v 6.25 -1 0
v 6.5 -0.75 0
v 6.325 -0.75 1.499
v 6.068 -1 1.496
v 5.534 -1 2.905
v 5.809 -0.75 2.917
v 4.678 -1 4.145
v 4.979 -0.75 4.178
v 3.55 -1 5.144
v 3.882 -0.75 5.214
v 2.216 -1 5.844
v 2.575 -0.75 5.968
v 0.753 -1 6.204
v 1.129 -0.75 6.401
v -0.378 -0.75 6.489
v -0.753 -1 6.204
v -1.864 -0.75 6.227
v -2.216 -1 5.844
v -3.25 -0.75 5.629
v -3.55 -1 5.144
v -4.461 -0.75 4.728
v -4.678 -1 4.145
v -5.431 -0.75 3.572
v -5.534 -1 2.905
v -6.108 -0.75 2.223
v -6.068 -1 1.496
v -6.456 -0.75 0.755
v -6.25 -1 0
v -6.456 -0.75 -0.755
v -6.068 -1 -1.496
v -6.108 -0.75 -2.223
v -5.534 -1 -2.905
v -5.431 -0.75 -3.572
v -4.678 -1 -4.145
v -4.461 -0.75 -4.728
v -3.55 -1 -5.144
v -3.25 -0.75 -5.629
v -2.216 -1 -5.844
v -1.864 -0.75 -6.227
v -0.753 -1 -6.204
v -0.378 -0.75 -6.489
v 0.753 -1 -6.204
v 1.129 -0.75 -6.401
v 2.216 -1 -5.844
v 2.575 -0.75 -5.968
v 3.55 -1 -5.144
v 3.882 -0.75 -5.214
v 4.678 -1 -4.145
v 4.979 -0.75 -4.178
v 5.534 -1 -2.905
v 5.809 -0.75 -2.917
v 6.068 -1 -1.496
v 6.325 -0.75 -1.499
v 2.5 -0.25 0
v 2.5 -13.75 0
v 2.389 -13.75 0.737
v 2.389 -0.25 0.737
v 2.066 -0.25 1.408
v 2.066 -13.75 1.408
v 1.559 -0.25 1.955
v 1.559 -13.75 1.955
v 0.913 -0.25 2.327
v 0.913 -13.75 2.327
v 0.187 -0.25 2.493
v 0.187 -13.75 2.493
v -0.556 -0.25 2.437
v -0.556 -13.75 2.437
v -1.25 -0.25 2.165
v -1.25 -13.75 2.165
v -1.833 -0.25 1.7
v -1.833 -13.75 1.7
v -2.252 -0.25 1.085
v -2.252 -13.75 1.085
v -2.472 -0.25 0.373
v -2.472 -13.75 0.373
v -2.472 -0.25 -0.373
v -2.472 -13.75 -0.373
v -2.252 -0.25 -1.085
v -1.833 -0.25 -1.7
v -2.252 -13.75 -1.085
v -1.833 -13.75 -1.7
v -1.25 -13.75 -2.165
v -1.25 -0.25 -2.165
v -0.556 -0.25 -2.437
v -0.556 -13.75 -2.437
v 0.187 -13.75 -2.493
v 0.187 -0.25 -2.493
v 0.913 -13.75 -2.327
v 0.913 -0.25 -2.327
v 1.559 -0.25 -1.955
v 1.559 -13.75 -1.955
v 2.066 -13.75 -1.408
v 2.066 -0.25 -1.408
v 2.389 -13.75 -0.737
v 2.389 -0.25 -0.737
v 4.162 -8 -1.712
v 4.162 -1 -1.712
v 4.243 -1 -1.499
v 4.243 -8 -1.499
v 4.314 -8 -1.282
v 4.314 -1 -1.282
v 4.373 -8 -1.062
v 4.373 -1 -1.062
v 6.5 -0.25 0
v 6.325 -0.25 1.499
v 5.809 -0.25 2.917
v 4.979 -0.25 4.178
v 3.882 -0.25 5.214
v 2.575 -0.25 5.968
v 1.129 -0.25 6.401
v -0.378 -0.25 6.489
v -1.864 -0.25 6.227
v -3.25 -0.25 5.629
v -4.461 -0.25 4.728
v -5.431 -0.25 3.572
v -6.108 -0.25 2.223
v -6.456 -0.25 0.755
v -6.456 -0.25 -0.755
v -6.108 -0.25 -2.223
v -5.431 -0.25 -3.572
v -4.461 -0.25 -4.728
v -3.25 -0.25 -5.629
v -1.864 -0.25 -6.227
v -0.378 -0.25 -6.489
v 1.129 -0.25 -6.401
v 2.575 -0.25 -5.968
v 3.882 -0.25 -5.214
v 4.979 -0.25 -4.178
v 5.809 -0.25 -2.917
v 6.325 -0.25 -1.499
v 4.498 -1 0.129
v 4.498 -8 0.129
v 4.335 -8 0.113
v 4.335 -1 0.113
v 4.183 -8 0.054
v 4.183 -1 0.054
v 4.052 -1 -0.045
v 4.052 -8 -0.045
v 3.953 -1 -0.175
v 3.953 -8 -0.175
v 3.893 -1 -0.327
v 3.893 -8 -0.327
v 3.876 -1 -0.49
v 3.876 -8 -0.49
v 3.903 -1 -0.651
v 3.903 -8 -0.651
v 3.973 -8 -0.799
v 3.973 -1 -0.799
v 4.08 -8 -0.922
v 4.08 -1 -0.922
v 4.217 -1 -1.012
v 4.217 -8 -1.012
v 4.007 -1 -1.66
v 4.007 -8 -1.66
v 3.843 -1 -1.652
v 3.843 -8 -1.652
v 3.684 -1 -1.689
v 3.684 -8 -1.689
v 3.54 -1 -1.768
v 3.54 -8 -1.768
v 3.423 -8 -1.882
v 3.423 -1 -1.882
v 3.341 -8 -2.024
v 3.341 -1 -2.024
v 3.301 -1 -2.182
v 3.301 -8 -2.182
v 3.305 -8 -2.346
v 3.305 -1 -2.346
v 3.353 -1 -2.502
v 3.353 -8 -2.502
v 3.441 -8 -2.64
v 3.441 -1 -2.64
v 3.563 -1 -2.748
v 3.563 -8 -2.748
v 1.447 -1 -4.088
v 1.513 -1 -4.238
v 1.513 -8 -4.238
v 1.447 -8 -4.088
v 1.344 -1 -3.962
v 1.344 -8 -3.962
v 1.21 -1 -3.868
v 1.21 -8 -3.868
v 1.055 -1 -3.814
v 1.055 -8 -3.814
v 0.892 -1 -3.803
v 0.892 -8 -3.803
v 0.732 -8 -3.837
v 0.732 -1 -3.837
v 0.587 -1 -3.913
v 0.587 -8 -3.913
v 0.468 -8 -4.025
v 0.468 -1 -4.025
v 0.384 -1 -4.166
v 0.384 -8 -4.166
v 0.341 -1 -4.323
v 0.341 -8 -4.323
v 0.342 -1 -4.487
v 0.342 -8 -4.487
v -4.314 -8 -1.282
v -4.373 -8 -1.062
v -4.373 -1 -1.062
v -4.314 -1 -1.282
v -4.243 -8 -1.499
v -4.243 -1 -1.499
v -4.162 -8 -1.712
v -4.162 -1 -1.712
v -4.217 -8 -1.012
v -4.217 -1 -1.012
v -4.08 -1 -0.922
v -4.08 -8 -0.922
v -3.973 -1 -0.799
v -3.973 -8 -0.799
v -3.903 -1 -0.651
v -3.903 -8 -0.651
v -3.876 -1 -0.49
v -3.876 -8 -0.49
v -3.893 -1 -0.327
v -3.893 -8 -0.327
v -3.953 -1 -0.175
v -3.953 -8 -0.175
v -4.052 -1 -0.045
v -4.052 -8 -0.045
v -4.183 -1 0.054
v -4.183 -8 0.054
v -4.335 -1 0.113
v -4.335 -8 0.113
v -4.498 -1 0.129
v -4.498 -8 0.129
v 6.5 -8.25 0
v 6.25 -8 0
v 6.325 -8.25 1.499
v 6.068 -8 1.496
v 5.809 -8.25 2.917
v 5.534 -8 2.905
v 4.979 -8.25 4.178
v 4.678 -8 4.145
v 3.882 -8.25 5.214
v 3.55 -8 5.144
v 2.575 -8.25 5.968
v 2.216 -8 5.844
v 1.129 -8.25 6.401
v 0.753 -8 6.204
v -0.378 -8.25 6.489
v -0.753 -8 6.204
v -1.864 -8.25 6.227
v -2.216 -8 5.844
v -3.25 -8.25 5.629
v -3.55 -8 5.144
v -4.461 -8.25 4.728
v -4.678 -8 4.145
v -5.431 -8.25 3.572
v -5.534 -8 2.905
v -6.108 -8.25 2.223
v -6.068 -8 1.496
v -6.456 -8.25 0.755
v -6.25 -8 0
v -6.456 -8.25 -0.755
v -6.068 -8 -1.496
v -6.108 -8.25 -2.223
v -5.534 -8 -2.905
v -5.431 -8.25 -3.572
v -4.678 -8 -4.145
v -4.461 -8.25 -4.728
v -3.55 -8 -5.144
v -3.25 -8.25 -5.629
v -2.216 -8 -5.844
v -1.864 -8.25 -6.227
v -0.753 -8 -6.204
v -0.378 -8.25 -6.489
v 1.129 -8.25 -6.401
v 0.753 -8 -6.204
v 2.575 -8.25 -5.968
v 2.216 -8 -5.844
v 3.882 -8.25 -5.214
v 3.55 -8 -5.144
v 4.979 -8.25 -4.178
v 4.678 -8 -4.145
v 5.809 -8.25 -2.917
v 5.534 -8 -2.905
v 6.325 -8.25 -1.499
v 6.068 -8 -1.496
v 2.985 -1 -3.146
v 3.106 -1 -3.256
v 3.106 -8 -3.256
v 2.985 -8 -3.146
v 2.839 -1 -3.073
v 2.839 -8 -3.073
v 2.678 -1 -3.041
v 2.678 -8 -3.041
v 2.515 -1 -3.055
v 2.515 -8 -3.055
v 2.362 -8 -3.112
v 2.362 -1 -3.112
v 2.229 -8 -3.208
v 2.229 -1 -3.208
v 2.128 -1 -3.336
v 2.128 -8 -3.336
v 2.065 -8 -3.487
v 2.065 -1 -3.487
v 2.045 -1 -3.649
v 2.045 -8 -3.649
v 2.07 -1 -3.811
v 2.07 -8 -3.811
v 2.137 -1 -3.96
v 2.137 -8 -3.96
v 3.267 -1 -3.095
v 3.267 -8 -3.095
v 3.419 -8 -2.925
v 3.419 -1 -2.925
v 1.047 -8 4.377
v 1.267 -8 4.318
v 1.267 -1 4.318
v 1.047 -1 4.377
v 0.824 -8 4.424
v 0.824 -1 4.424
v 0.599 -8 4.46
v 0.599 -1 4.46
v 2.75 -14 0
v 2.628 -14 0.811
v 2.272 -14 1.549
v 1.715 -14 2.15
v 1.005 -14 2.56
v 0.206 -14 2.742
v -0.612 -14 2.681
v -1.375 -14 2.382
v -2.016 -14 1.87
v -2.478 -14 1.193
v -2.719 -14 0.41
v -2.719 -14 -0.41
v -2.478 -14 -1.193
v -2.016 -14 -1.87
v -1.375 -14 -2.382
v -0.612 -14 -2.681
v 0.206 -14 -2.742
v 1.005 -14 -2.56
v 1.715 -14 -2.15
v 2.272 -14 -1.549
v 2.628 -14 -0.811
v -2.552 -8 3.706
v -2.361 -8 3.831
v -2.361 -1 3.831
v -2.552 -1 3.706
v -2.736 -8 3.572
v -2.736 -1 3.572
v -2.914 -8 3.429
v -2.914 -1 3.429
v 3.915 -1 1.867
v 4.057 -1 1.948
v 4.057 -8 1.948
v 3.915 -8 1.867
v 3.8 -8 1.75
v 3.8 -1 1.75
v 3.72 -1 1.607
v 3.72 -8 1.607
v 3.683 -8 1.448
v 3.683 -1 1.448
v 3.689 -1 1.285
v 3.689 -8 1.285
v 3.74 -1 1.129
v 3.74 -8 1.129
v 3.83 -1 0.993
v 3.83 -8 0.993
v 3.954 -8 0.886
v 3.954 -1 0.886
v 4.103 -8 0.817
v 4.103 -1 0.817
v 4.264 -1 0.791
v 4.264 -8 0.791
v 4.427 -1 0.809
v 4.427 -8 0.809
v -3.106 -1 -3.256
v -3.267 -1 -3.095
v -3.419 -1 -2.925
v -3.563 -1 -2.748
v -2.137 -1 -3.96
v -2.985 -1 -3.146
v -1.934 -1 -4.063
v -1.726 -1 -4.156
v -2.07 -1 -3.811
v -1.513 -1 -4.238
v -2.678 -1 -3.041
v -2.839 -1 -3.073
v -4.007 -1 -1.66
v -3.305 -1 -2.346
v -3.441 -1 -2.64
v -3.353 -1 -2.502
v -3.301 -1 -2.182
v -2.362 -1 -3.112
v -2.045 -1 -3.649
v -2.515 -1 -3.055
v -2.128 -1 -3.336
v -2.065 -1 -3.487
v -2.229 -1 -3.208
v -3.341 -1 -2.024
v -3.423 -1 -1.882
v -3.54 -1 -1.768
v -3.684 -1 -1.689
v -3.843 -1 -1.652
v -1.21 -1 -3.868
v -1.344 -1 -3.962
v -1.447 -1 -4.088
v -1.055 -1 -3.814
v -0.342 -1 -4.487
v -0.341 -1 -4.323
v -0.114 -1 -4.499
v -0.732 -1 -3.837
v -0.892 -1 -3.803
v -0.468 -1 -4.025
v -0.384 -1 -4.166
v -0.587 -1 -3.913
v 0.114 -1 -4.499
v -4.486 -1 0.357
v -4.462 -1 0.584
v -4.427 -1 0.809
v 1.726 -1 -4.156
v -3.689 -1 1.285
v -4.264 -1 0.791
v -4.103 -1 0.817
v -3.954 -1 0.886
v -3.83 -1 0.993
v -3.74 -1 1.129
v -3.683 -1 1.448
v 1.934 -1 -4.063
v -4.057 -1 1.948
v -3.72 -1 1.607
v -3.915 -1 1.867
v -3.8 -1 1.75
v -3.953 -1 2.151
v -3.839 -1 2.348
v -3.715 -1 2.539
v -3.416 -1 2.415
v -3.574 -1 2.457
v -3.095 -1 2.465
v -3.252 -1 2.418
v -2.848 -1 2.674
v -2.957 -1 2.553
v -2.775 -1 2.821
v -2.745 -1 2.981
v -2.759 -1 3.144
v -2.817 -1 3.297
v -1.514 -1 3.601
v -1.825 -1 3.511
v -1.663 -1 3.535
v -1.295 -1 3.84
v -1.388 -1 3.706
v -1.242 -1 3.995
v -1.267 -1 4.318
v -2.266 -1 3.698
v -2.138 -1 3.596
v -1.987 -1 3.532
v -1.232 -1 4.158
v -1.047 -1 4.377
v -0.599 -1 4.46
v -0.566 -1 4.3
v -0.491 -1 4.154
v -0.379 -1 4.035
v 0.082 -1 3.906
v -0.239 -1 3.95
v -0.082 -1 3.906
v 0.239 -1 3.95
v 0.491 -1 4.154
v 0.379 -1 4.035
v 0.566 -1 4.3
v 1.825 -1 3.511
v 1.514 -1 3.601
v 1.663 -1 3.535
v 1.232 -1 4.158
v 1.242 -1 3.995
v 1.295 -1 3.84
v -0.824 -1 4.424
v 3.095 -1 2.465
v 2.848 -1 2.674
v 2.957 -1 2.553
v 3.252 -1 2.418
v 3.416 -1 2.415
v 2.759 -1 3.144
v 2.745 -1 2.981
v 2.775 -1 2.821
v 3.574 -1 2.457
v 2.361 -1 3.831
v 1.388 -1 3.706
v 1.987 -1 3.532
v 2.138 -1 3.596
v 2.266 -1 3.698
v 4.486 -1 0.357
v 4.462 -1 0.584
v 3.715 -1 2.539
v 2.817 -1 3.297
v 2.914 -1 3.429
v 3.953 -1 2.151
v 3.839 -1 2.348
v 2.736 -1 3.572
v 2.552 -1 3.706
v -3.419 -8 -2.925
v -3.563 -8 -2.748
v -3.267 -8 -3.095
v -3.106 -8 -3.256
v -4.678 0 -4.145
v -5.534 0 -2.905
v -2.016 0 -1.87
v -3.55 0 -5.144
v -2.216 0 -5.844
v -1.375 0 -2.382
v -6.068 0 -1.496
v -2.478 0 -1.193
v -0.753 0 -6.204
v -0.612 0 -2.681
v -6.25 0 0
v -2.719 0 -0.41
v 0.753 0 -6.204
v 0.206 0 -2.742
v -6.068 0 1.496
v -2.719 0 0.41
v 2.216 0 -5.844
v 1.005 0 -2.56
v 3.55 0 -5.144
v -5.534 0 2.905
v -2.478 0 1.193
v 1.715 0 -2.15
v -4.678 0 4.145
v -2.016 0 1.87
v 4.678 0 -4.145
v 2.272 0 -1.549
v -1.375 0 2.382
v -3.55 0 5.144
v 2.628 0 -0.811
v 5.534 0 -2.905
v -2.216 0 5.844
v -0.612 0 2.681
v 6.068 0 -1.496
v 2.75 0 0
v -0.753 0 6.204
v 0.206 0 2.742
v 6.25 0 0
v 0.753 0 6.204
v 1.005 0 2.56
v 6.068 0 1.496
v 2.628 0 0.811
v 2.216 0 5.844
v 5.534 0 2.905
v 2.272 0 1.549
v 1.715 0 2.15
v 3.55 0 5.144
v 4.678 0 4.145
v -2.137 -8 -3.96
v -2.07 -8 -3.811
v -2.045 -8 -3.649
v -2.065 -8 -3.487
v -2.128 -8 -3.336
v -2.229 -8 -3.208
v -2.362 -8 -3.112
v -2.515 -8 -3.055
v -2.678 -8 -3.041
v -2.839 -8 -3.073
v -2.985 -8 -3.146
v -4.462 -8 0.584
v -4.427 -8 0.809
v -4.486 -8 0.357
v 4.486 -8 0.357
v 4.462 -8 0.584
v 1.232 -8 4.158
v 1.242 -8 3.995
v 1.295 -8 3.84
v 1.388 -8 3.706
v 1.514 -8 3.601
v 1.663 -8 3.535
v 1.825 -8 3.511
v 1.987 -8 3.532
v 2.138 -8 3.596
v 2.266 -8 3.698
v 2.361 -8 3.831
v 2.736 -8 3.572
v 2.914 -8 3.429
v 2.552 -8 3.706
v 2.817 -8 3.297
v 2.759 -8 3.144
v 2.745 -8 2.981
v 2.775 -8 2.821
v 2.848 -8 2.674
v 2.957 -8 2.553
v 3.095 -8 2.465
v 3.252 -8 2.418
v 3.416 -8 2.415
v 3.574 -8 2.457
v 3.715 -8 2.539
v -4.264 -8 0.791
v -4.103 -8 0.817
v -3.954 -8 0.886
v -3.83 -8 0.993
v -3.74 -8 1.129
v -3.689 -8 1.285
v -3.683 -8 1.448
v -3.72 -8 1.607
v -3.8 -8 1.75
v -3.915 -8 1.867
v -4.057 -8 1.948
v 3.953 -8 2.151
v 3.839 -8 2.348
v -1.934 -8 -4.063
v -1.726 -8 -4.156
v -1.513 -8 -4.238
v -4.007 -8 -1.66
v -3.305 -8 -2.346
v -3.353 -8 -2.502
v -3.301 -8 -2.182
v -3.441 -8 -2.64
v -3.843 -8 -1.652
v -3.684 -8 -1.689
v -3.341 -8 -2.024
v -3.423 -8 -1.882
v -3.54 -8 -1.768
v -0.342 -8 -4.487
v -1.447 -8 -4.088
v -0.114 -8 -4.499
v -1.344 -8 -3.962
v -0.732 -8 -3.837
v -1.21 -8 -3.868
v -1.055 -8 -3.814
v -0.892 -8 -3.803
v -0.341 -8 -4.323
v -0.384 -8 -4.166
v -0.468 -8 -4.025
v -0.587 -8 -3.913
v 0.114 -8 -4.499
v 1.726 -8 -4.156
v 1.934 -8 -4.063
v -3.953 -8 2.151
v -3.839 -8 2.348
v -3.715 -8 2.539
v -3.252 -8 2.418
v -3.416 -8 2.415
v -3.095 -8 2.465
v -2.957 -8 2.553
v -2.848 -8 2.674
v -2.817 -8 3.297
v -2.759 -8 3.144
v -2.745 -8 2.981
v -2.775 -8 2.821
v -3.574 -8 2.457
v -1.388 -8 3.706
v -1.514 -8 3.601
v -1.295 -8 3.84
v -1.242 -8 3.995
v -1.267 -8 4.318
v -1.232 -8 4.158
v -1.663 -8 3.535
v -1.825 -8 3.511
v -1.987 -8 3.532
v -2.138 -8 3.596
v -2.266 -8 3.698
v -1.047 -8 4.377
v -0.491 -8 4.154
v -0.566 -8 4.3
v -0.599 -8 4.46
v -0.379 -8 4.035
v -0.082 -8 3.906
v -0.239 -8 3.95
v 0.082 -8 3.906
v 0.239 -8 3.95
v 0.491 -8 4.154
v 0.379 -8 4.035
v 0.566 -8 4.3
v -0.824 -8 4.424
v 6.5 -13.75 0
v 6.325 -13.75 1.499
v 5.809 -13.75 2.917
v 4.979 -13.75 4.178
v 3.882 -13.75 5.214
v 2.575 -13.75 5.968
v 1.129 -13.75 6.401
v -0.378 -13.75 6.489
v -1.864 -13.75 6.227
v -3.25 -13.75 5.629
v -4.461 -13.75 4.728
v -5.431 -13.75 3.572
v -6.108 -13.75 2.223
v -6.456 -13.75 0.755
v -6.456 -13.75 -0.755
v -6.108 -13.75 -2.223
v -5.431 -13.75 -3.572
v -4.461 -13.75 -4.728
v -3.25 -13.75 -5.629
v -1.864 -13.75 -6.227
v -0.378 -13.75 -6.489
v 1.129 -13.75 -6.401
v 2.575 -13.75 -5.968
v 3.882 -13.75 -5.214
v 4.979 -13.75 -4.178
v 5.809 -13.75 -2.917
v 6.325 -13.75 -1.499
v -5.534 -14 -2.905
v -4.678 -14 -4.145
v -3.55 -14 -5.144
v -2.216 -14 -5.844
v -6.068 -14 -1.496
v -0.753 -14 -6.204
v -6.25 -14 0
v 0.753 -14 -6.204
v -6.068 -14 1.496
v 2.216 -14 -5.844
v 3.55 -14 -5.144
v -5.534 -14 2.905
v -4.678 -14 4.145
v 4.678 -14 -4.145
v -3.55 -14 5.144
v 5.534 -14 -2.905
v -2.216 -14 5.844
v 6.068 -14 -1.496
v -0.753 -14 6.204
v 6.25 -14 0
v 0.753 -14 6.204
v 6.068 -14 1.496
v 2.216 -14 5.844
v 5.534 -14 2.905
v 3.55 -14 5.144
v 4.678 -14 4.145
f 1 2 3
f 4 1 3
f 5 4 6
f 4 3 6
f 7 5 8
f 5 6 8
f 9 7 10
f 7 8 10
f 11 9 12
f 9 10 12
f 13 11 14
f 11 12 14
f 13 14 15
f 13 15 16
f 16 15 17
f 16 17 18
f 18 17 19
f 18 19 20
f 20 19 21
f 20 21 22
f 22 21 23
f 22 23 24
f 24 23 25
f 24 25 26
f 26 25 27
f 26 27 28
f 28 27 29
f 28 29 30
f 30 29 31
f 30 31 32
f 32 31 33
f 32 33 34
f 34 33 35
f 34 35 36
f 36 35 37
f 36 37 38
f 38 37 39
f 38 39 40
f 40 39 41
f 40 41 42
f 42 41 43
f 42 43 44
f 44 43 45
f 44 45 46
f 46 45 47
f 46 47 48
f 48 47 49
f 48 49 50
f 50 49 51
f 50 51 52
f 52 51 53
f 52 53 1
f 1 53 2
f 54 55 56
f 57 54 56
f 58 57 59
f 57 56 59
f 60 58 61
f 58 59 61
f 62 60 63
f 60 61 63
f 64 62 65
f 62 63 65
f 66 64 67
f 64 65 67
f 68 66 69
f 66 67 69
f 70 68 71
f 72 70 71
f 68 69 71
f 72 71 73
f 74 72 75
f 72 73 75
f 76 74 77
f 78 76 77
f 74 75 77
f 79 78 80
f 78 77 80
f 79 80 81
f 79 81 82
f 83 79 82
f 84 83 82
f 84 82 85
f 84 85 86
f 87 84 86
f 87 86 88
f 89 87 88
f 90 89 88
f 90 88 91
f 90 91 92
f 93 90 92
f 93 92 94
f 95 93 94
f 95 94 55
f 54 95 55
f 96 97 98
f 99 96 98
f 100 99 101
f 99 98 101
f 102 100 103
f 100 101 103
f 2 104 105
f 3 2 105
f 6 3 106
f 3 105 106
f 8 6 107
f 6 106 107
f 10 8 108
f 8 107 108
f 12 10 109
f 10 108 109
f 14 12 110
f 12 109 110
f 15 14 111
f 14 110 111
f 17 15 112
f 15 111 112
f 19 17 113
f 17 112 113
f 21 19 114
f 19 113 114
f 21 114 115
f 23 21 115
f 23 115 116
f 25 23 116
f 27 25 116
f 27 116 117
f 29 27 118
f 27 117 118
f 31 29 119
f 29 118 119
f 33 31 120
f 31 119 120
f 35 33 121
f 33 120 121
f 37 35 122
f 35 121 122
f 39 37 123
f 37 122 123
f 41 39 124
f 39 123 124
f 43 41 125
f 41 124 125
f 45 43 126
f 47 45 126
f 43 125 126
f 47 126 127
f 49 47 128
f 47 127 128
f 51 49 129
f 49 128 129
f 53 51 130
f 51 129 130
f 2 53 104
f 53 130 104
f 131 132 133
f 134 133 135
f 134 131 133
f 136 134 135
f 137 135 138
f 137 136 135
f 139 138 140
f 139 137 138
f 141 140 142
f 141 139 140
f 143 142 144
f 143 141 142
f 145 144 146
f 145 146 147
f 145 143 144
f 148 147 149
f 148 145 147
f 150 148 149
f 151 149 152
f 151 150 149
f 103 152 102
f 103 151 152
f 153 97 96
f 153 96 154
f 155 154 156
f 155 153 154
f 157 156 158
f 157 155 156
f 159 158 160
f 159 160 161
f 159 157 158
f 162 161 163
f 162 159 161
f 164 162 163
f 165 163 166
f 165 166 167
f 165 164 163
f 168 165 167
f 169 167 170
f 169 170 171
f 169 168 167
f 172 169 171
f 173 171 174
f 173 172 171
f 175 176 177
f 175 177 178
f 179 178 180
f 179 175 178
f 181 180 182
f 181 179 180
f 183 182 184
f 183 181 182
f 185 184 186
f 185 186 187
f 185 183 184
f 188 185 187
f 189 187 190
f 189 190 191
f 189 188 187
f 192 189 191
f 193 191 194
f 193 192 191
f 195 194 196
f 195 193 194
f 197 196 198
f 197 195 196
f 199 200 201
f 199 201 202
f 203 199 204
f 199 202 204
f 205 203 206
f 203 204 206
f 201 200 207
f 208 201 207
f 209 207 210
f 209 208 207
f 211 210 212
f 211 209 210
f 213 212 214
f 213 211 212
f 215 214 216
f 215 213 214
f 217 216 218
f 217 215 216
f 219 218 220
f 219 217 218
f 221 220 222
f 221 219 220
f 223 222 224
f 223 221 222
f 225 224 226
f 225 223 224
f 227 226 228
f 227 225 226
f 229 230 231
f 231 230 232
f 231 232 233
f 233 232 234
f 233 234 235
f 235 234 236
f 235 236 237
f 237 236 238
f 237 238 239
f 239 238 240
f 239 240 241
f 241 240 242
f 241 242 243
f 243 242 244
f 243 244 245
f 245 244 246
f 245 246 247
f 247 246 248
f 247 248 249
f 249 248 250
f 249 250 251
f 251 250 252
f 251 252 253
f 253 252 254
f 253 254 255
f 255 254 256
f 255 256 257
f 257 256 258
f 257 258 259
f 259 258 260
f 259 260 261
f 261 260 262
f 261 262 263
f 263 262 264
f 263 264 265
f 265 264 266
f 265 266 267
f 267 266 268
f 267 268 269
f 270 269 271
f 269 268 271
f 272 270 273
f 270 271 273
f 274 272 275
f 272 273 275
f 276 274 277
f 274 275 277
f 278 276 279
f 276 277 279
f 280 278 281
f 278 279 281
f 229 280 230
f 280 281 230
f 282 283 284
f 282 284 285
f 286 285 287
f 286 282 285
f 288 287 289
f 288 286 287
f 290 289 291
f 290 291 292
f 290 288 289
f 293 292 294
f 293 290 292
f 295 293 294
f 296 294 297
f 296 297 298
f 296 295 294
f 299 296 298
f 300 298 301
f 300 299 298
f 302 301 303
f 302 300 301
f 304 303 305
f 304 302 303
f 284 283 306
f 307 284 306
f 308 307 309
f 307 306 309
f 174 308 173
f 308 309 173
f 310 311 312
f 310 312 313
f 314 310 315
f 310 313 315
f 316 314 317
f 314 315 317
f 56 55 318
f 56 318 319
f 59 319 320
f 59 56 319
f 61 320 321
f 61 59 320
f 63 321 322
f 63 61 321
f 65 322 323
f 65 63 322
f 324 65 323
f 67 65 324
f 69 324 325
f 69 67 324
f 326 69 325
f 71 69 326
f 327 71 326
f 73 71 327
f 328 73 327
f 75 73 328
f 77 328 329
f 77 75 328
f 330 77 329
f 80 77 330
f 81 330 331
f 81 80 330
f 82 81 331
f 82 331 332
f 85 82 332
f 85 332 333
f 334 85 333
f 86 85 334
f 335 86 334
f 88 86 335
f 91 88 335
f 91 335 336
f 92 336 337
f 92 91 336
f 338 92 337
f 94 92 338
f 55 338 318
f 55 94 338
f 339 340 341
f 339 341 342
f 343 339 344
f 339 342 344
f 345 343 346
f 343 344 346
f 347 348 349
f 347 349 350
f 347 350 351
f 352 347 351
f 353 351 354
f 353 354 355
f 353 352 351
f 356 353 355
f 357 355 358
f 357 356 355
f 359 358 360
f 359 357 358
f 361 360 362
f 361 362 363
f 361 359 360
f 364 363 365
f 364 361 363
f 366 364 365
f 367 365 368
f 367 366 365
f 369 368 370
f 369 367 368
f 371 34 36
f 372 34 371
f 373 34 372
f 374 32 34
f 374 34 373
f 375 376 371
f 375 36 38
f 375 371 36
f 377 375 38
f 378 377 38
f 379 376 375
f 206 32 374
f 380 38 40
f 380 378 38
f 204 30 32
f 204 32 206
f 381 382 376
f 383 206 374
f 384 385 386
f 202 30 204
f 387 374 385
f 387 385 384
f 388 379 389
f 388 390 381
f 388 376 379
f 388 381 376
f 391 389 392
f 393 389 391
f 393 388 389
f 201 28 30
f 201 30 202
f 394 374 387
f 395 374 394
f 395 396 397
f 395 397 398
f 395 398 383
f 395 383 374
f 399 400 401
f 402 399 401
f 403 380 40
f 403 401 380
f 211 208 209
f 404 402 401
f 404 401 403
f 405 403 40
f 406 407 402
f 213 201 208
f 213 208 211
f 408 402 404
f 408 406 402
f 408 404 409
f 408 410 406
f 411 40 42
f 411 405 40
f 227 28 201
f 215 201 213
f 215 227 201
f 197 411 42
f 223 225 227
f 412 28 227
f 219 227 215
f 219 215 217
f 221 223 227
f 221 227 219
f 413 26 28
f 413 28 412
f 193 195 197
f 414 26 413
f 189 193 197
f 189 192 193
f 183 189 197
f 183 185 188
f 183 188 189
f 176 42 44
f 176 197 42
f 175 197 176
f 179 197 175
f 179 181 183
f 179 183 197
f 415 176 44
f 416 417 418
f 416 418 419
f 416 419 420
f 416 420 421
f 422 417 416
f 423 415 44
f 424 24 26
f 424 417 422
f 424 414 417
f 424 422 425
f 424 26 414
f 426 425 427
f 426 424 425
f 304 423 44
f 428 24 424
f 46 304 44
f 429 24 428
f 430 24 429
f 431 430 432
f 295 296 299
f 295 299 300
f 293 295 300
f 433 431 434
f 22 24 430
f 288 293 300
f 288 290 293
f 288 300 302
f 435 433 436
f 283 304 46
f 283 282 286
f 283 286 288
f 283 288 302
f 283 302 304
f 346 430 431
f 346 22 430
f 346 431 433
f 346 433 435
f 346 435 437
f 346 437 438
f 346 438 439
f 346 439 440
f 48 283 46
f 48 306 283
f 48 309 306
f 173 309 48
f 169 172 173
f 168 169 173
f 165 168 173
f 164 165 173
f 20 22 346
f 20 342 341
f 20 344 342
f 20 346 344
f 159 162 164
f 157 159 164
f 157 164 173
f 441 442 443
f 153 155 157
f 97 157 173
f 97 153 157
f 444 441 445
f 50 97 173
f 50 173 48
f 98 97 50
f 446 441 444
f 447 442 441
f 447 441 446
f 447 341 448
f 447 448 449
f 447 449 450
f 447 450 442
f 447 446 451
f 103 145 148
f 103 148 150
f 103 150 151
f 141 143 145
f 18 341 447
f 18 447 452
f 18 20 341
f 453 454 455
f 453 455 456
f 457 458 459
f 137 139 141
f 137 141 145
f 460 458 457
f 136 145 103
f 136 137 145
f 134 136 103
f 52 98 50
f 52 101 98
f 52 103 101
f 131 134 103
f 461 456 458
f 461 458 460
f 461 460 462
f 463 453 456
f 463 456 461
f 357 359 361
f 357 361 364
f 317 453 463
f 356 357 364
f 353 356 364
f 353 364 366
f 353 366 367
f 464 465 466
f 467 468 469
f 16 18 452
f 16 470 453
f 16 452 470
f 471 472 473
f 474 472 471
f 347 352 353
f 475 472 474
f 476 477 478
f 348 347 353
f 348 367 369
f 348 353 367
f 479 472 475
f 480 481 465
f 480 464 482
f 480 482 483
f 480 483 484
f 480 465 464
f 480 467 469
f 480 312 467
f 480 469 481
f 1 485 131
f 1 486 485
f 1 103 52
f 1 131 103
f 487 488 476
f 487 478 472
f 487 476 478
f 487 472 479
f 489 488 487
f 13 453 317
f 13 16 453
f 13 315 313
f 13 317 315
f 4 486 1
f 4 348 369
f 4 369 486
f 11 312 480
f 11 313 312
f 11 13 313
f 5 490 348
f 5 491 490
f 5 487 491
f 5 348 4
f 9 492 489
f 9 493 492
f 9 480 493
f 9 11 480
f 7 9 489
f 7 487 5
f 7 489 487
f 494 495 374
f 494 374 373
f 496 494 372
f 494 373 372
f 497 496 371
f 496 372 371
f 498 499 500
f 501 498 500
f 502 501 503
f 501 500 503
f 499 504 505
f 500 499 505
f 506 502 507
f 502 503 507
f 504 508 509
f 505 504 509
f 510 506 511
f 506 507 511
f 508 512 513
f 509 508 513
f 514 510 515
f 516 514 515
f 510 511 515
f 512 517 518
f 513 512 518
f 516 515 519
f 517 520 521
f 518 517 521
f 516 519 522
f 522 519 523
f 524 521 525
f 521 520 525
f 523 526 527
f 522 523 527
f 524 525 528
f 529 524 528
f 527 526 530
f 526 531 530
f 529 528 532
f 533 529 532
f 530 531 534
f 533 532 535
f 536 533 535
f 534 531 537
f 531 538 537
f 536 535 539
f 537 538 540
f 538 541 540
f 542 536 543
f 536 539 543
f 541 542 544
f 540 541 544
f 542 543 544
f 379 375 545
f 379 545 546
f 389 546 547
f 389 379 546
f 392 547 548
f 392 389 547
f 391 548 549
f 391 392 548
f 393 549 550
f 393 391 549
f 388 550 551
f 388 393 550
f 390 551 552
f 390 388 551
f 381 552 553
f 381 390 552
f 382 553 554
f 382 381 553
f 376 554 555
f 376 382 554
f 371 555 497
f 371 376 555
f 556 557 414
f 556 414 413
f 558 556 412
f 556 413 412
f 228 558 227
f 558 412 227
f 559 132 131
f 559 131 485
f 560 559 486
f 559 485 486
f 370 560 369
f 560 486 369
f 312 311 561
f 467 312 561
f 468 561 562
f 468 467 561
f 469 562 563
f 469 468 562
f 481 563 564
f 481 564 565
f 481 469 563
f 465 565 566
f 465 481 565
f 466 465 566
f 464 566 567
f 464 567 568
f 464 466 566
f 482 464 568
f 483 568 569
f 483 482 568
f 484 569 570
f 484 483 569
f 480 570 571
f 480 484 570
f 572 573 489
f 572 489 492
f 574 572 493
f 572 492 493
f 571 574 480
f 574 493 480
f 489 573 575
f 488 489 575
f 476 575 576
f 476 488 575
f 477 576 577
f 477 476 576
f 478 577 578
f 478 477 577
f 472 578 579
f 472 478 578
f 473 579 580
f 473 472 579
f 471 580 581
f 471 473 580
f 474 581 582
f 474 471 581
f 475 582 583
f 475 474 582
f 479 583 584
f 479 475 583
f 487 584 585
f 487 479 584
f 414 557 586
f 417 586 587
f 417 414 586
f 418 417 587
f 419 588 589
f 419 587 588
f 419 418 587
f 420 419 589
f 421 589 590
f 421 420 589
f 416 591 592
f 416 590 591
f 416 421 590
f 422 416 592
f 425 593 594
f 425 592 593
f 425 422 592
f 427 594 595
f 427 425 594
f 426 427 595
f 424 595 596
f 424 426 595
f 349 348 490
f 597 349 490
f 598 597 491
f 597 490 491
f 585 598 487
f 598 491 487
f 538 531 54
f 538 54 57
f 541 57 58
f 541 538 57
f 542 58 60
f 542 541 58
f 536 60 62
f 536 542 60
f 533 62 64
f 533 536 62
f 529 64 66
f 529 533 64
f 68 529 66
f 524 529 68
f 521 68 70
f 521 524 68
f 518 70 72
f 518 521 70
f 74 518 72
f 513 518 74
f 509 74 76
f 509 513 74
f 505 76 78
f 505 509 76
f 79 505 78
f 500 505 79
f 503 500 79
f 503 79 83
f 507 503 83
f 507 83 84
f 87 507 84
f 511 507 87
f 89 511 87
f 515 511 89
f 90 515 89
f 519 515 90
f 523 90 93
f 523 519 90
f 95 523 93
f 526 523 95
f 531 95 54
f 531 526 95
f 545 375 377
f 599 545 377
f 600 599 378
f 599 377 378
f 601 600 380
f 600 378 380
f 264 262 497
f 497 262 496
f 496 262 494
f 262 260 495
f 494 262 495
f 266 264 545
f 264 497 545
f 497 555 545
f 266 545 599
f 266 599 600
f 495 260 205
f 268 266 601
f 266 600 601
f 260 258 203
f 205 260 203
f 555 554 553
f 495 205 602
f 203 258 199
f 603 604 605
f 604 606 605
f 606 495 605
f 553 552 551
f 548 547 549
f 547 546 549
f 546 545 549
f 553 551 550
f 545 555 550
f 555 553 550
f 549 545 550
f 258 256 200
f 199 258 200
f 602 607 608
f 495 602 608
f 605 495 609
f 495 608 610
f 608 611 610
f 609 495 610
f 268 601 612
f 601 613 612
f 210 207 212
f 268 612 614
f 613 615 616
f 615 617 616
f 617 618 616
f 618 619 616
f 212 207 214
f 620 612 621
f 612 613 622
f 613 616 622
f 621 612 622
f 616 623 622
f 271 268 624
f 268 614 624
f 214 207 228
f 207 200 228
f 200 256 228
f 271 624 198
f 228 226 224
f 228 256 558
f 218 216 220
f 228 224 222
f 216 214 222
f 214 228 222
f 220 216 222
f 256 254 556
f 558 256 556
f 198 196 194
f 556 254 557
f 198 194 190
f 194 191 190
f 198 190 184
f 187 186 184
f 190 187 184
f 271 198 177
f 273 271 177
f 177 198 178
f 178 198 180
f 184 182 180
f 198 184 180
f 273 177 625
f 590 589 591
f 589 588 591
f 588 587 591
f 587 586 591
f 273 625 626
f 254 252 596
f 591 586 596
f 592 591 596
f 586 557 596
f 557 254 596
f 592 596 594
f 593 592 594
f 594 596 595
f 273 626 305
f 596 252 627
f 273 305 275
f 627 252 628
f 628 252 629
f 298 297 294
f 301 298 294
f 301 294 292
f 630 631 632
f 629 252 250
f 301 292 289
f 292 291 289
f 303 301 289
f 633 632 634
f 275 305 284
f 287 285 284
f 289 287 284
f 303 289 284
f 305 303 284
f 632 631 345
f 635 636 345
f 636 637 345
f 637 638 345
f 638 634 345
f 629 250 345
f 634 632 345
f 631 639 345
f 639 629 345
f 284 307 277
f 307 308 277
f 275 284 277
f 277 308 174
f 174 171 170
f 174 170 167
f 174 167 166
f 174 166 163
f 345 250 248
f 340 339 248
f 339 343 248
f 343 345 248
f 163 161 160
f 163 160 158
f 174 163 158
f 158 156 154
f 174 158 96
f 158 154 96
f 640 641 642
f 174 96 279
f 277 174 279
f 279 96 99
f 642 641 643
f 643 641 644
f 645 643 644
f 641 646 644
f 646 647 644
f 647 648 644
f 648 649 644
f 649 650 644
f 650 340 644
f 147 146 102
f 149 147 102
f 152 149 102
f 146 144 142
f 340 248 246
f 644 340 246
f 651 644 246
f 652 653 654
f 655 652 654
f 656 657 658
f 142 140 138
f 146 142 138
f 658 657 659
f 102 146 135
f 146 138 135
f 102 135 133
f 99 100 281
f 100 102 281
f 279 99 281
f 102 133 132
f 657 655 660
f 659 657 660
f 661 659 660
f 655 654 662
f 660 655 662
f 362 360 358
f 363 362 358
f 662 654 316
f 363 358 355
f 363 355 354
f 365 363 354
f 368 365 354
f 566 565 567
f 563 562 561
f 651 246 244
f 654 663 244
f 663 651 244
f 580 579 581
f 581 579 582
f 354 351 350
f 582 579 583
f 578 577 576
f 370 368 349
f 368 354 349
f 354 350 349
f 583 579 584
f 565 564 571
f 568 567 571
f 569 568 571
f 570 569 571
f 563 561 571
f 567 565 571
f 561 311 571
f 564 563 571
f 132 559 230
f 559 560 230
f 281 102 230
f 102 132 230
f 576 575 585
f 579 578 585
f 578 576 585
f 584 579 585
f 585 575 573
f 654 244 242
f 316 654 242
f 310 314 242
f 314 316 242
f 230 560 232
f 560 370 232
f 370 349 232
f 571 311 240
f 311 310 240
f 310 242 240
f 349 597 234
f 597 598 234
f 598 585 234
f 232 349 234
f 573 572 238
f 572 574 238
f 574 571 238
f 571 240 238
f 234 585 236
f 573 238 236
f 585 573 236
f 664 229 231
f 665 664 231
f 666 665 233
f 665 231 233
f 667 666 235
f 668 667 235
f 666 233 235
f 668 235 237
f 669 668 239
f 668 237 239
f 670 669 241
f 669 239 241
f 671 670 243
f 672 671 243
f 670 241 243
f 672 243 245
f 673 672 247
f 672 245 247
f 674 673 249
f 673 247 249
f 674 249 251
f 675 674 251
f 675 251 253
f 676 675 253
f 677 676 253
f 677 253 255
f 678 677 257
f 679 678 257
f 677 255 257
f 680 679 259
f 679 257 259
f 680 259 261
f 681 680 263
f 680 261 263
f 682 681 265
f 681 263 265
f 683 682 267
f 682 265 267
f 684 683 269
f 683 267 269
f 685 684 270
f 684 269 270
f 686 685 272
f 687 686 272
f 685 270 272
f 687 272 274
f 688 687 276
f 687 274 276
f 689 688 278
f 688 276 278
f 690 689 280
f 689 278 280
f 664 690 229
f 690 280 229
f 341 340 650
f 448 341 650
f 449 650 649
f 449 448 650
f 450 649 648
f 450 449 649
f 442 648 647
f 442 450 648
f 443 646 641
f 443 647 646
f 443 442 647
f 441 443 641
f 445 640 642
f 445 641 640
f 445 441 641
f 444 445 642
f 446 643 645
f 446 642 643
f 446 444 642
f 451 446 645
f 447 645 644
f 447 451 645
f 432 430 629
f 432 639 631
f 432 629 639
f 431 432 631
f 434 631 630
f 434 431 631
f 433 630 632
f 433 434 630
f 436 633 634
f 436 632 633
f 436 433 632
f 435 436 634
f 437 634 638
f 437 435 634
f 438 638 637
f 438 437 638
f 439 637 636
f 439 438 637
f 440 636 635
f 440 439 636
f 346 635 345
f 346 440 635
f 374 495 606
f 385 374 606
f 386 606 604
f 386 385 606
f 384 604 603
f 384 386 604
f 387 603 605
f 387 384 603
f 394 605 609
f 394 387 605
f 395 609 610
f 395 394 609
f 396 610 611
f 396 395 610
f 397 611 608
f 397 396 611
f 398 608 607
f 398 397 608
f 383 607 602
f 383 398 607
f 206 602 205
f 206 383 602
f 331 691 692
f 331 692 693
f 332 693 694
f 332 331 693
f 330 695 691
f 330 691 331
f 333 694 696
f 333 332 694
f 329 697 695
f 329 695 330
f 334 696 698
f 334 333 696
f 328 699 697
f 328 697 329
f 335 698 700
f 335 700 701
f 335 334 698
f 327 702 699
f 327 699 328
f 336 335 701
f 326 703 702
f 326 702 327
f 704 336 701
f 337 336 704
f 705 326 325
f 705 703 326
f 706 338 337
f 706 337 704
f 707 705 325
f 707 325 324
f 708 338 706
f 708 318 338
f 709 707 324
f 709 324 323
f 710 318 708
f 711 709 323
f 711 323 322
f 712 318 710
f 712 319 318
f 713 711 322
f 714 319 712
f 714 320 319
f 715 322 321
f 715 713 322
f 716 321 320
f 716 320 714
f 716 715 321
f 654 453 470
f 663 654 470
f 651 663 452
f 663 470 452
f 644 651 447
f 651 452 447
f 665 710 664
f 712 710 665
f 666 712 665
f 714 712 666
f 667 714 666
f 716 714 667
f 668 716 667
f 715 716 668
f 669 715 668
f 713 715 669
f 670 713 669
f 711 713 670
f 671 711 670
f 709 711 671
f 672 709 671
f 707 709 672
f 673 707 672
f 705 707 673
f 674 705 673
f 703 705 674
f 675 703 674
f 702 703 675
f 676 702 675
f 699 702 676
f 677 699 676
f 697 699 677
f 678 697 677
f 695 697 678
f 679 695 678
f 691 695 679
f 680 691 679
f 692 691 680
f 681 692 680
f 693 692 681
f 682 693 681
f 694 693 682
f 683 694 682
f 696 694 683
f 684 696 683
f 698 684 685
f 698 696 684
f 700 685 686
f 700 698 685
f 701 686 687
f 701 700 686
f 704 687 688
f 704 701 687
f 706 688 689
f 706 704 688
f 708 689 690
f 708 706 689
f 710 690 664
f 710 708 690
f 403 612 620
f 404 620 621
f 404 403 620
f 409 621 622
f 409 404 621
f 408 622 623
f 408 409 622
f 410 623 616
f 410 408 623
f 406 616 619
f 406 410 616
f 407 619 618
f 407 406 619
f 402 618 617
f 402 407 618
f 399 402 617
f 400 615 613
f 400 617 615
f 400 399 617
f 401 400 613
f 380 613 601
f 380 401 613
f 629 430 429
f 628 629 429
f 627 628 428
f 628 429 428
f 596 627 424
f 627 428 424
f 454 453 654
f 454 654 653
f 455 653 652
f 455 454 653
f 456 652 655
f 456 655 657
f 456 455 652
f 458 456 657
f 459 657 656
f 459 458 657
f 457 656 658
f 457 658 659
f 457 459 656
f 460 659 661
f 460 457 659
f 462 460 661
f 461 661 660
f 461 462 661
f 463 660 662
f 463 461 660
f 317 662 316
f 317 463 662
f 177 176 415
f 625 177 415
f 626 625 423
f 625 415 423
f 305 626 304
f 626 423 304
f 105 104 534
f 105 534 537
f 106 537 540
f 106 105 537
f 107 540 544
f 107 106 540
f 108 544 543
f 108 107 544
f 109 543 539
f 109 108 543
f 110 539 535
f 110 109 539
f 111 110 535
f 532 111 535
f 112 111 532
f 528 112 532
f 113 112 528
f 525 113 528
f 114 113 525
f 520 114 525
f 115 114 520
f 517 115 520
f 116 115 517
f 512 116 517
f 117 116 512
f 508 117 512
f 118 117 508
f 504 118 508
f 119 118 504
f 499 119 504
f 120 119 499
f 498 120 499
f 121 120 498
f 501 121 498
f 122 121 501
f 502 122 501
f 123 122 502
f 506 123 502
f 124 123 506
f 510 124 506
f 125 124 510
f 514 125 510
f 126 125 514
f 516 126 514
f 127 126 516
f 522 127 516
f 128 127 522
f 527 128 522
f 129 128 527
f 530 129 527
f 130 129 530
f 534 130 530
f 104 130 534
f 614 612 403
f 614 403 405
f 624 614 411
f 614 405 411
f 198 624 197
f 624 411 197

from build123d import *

# Parameters (mm, degrees)
F0_R     = 6.5
F1_DEPTH = 1
F2_R     = 4.5
F3_DEPTH = 7
F4_R     = 6.5
F5_DEPTH = 6
F6_R     = 0.6
F7_DEPTH = 7
F8_R     = 2.5
F9_DEPTH = 14.001
F10_SIZE = 0.25


with BuildPart() as f1:
    # F0 (on Front) → F1 (new body)
    with BuildSketch(Plane.XZ):
        Circle(F0_R)
    extrude(amount=F1_DEPTH)

    # F2 (on face) → F3 (join)
    with BuildSketch(Plane.XZ.offset(1)):
        Circle(F2_R)
    extrude(amount=F3_DEPTH)

    # F4 (on face) → F5 (join)
    with BuildSketch(Plane.XZ.offset(8)):
        Circle(F4_R)
    extrude(amount=F5_DEPTH)

    # F6 (on face) → F7 (cut, through all)
    with BuildSketch(Plane.XZ.offset(1)):
        with Locations((0, 4.5)):
            Circle(F6_R)
        with Locations((-1.830315, 4.110955)):
            Circle(F6_R)
        with Locations((-3.344152, 3.011088)):
            Circle(F6_R)
        with Locations((-4.279754, 1.390576)):
            Circle(F6_R)
        with Locations((-4.475349, -0.470378)):
            Circle(F6_R)
        with Locations((-3.897114, -2.25)):
            Circle(F6_R)
        with Locations((-2.645034, -3.640576)):
            Circle(F6_R)
        with Locations((-0.935603, -4.401664)):
            Circle(F6_R)
        with Locations((0.935603, -4.401664)):
            Circle(F6_R)
        with Locations((2.645034, -3.640576)):
            Circle(F6_R)
        with Locations((3.897114, -2.25)):
            Circle(F6_R)
        with Locations((4.475349, -0.470378)):
            Circle(F6_R)
        with Locations((4.279754, 1.390576)):
            Circle(F6_R)
        with Locations((3.344152, 3.011088)):
            Circle(F6_R)
        with Locations((1.830315, 4.110955)):
            Circle(F6_R)
    extrude(amount=F7_DEPTH, mode=Mode.SUBTRACT)

    # F8 (on face) → F9 (cut, through all)
    with BuildSketch(Plane.XZ.offset(14)):
        Circle(F8_R)
    extrude(amount=-F9_DEPTH, mode=Mode.SUBTRACT)

    # F10
    f10_edges = [f1.edges().sort_by_distance(p)[0] for p in [
        (6.5, -11, 0),
        (-6.5, -8, 0),
        (-6.5, -14, 0),
        (6.5, -0.5, 0),
        (-6.5, 0, 0),
        (-6.5, -1, 0),
        (-2.5, -14, 0),
        (2.5, -7, 0),
        (-2.5, 0, 0),
    ]]
    chamfer(f10_edges, length=F10_SIZE)


solid = f1.part
